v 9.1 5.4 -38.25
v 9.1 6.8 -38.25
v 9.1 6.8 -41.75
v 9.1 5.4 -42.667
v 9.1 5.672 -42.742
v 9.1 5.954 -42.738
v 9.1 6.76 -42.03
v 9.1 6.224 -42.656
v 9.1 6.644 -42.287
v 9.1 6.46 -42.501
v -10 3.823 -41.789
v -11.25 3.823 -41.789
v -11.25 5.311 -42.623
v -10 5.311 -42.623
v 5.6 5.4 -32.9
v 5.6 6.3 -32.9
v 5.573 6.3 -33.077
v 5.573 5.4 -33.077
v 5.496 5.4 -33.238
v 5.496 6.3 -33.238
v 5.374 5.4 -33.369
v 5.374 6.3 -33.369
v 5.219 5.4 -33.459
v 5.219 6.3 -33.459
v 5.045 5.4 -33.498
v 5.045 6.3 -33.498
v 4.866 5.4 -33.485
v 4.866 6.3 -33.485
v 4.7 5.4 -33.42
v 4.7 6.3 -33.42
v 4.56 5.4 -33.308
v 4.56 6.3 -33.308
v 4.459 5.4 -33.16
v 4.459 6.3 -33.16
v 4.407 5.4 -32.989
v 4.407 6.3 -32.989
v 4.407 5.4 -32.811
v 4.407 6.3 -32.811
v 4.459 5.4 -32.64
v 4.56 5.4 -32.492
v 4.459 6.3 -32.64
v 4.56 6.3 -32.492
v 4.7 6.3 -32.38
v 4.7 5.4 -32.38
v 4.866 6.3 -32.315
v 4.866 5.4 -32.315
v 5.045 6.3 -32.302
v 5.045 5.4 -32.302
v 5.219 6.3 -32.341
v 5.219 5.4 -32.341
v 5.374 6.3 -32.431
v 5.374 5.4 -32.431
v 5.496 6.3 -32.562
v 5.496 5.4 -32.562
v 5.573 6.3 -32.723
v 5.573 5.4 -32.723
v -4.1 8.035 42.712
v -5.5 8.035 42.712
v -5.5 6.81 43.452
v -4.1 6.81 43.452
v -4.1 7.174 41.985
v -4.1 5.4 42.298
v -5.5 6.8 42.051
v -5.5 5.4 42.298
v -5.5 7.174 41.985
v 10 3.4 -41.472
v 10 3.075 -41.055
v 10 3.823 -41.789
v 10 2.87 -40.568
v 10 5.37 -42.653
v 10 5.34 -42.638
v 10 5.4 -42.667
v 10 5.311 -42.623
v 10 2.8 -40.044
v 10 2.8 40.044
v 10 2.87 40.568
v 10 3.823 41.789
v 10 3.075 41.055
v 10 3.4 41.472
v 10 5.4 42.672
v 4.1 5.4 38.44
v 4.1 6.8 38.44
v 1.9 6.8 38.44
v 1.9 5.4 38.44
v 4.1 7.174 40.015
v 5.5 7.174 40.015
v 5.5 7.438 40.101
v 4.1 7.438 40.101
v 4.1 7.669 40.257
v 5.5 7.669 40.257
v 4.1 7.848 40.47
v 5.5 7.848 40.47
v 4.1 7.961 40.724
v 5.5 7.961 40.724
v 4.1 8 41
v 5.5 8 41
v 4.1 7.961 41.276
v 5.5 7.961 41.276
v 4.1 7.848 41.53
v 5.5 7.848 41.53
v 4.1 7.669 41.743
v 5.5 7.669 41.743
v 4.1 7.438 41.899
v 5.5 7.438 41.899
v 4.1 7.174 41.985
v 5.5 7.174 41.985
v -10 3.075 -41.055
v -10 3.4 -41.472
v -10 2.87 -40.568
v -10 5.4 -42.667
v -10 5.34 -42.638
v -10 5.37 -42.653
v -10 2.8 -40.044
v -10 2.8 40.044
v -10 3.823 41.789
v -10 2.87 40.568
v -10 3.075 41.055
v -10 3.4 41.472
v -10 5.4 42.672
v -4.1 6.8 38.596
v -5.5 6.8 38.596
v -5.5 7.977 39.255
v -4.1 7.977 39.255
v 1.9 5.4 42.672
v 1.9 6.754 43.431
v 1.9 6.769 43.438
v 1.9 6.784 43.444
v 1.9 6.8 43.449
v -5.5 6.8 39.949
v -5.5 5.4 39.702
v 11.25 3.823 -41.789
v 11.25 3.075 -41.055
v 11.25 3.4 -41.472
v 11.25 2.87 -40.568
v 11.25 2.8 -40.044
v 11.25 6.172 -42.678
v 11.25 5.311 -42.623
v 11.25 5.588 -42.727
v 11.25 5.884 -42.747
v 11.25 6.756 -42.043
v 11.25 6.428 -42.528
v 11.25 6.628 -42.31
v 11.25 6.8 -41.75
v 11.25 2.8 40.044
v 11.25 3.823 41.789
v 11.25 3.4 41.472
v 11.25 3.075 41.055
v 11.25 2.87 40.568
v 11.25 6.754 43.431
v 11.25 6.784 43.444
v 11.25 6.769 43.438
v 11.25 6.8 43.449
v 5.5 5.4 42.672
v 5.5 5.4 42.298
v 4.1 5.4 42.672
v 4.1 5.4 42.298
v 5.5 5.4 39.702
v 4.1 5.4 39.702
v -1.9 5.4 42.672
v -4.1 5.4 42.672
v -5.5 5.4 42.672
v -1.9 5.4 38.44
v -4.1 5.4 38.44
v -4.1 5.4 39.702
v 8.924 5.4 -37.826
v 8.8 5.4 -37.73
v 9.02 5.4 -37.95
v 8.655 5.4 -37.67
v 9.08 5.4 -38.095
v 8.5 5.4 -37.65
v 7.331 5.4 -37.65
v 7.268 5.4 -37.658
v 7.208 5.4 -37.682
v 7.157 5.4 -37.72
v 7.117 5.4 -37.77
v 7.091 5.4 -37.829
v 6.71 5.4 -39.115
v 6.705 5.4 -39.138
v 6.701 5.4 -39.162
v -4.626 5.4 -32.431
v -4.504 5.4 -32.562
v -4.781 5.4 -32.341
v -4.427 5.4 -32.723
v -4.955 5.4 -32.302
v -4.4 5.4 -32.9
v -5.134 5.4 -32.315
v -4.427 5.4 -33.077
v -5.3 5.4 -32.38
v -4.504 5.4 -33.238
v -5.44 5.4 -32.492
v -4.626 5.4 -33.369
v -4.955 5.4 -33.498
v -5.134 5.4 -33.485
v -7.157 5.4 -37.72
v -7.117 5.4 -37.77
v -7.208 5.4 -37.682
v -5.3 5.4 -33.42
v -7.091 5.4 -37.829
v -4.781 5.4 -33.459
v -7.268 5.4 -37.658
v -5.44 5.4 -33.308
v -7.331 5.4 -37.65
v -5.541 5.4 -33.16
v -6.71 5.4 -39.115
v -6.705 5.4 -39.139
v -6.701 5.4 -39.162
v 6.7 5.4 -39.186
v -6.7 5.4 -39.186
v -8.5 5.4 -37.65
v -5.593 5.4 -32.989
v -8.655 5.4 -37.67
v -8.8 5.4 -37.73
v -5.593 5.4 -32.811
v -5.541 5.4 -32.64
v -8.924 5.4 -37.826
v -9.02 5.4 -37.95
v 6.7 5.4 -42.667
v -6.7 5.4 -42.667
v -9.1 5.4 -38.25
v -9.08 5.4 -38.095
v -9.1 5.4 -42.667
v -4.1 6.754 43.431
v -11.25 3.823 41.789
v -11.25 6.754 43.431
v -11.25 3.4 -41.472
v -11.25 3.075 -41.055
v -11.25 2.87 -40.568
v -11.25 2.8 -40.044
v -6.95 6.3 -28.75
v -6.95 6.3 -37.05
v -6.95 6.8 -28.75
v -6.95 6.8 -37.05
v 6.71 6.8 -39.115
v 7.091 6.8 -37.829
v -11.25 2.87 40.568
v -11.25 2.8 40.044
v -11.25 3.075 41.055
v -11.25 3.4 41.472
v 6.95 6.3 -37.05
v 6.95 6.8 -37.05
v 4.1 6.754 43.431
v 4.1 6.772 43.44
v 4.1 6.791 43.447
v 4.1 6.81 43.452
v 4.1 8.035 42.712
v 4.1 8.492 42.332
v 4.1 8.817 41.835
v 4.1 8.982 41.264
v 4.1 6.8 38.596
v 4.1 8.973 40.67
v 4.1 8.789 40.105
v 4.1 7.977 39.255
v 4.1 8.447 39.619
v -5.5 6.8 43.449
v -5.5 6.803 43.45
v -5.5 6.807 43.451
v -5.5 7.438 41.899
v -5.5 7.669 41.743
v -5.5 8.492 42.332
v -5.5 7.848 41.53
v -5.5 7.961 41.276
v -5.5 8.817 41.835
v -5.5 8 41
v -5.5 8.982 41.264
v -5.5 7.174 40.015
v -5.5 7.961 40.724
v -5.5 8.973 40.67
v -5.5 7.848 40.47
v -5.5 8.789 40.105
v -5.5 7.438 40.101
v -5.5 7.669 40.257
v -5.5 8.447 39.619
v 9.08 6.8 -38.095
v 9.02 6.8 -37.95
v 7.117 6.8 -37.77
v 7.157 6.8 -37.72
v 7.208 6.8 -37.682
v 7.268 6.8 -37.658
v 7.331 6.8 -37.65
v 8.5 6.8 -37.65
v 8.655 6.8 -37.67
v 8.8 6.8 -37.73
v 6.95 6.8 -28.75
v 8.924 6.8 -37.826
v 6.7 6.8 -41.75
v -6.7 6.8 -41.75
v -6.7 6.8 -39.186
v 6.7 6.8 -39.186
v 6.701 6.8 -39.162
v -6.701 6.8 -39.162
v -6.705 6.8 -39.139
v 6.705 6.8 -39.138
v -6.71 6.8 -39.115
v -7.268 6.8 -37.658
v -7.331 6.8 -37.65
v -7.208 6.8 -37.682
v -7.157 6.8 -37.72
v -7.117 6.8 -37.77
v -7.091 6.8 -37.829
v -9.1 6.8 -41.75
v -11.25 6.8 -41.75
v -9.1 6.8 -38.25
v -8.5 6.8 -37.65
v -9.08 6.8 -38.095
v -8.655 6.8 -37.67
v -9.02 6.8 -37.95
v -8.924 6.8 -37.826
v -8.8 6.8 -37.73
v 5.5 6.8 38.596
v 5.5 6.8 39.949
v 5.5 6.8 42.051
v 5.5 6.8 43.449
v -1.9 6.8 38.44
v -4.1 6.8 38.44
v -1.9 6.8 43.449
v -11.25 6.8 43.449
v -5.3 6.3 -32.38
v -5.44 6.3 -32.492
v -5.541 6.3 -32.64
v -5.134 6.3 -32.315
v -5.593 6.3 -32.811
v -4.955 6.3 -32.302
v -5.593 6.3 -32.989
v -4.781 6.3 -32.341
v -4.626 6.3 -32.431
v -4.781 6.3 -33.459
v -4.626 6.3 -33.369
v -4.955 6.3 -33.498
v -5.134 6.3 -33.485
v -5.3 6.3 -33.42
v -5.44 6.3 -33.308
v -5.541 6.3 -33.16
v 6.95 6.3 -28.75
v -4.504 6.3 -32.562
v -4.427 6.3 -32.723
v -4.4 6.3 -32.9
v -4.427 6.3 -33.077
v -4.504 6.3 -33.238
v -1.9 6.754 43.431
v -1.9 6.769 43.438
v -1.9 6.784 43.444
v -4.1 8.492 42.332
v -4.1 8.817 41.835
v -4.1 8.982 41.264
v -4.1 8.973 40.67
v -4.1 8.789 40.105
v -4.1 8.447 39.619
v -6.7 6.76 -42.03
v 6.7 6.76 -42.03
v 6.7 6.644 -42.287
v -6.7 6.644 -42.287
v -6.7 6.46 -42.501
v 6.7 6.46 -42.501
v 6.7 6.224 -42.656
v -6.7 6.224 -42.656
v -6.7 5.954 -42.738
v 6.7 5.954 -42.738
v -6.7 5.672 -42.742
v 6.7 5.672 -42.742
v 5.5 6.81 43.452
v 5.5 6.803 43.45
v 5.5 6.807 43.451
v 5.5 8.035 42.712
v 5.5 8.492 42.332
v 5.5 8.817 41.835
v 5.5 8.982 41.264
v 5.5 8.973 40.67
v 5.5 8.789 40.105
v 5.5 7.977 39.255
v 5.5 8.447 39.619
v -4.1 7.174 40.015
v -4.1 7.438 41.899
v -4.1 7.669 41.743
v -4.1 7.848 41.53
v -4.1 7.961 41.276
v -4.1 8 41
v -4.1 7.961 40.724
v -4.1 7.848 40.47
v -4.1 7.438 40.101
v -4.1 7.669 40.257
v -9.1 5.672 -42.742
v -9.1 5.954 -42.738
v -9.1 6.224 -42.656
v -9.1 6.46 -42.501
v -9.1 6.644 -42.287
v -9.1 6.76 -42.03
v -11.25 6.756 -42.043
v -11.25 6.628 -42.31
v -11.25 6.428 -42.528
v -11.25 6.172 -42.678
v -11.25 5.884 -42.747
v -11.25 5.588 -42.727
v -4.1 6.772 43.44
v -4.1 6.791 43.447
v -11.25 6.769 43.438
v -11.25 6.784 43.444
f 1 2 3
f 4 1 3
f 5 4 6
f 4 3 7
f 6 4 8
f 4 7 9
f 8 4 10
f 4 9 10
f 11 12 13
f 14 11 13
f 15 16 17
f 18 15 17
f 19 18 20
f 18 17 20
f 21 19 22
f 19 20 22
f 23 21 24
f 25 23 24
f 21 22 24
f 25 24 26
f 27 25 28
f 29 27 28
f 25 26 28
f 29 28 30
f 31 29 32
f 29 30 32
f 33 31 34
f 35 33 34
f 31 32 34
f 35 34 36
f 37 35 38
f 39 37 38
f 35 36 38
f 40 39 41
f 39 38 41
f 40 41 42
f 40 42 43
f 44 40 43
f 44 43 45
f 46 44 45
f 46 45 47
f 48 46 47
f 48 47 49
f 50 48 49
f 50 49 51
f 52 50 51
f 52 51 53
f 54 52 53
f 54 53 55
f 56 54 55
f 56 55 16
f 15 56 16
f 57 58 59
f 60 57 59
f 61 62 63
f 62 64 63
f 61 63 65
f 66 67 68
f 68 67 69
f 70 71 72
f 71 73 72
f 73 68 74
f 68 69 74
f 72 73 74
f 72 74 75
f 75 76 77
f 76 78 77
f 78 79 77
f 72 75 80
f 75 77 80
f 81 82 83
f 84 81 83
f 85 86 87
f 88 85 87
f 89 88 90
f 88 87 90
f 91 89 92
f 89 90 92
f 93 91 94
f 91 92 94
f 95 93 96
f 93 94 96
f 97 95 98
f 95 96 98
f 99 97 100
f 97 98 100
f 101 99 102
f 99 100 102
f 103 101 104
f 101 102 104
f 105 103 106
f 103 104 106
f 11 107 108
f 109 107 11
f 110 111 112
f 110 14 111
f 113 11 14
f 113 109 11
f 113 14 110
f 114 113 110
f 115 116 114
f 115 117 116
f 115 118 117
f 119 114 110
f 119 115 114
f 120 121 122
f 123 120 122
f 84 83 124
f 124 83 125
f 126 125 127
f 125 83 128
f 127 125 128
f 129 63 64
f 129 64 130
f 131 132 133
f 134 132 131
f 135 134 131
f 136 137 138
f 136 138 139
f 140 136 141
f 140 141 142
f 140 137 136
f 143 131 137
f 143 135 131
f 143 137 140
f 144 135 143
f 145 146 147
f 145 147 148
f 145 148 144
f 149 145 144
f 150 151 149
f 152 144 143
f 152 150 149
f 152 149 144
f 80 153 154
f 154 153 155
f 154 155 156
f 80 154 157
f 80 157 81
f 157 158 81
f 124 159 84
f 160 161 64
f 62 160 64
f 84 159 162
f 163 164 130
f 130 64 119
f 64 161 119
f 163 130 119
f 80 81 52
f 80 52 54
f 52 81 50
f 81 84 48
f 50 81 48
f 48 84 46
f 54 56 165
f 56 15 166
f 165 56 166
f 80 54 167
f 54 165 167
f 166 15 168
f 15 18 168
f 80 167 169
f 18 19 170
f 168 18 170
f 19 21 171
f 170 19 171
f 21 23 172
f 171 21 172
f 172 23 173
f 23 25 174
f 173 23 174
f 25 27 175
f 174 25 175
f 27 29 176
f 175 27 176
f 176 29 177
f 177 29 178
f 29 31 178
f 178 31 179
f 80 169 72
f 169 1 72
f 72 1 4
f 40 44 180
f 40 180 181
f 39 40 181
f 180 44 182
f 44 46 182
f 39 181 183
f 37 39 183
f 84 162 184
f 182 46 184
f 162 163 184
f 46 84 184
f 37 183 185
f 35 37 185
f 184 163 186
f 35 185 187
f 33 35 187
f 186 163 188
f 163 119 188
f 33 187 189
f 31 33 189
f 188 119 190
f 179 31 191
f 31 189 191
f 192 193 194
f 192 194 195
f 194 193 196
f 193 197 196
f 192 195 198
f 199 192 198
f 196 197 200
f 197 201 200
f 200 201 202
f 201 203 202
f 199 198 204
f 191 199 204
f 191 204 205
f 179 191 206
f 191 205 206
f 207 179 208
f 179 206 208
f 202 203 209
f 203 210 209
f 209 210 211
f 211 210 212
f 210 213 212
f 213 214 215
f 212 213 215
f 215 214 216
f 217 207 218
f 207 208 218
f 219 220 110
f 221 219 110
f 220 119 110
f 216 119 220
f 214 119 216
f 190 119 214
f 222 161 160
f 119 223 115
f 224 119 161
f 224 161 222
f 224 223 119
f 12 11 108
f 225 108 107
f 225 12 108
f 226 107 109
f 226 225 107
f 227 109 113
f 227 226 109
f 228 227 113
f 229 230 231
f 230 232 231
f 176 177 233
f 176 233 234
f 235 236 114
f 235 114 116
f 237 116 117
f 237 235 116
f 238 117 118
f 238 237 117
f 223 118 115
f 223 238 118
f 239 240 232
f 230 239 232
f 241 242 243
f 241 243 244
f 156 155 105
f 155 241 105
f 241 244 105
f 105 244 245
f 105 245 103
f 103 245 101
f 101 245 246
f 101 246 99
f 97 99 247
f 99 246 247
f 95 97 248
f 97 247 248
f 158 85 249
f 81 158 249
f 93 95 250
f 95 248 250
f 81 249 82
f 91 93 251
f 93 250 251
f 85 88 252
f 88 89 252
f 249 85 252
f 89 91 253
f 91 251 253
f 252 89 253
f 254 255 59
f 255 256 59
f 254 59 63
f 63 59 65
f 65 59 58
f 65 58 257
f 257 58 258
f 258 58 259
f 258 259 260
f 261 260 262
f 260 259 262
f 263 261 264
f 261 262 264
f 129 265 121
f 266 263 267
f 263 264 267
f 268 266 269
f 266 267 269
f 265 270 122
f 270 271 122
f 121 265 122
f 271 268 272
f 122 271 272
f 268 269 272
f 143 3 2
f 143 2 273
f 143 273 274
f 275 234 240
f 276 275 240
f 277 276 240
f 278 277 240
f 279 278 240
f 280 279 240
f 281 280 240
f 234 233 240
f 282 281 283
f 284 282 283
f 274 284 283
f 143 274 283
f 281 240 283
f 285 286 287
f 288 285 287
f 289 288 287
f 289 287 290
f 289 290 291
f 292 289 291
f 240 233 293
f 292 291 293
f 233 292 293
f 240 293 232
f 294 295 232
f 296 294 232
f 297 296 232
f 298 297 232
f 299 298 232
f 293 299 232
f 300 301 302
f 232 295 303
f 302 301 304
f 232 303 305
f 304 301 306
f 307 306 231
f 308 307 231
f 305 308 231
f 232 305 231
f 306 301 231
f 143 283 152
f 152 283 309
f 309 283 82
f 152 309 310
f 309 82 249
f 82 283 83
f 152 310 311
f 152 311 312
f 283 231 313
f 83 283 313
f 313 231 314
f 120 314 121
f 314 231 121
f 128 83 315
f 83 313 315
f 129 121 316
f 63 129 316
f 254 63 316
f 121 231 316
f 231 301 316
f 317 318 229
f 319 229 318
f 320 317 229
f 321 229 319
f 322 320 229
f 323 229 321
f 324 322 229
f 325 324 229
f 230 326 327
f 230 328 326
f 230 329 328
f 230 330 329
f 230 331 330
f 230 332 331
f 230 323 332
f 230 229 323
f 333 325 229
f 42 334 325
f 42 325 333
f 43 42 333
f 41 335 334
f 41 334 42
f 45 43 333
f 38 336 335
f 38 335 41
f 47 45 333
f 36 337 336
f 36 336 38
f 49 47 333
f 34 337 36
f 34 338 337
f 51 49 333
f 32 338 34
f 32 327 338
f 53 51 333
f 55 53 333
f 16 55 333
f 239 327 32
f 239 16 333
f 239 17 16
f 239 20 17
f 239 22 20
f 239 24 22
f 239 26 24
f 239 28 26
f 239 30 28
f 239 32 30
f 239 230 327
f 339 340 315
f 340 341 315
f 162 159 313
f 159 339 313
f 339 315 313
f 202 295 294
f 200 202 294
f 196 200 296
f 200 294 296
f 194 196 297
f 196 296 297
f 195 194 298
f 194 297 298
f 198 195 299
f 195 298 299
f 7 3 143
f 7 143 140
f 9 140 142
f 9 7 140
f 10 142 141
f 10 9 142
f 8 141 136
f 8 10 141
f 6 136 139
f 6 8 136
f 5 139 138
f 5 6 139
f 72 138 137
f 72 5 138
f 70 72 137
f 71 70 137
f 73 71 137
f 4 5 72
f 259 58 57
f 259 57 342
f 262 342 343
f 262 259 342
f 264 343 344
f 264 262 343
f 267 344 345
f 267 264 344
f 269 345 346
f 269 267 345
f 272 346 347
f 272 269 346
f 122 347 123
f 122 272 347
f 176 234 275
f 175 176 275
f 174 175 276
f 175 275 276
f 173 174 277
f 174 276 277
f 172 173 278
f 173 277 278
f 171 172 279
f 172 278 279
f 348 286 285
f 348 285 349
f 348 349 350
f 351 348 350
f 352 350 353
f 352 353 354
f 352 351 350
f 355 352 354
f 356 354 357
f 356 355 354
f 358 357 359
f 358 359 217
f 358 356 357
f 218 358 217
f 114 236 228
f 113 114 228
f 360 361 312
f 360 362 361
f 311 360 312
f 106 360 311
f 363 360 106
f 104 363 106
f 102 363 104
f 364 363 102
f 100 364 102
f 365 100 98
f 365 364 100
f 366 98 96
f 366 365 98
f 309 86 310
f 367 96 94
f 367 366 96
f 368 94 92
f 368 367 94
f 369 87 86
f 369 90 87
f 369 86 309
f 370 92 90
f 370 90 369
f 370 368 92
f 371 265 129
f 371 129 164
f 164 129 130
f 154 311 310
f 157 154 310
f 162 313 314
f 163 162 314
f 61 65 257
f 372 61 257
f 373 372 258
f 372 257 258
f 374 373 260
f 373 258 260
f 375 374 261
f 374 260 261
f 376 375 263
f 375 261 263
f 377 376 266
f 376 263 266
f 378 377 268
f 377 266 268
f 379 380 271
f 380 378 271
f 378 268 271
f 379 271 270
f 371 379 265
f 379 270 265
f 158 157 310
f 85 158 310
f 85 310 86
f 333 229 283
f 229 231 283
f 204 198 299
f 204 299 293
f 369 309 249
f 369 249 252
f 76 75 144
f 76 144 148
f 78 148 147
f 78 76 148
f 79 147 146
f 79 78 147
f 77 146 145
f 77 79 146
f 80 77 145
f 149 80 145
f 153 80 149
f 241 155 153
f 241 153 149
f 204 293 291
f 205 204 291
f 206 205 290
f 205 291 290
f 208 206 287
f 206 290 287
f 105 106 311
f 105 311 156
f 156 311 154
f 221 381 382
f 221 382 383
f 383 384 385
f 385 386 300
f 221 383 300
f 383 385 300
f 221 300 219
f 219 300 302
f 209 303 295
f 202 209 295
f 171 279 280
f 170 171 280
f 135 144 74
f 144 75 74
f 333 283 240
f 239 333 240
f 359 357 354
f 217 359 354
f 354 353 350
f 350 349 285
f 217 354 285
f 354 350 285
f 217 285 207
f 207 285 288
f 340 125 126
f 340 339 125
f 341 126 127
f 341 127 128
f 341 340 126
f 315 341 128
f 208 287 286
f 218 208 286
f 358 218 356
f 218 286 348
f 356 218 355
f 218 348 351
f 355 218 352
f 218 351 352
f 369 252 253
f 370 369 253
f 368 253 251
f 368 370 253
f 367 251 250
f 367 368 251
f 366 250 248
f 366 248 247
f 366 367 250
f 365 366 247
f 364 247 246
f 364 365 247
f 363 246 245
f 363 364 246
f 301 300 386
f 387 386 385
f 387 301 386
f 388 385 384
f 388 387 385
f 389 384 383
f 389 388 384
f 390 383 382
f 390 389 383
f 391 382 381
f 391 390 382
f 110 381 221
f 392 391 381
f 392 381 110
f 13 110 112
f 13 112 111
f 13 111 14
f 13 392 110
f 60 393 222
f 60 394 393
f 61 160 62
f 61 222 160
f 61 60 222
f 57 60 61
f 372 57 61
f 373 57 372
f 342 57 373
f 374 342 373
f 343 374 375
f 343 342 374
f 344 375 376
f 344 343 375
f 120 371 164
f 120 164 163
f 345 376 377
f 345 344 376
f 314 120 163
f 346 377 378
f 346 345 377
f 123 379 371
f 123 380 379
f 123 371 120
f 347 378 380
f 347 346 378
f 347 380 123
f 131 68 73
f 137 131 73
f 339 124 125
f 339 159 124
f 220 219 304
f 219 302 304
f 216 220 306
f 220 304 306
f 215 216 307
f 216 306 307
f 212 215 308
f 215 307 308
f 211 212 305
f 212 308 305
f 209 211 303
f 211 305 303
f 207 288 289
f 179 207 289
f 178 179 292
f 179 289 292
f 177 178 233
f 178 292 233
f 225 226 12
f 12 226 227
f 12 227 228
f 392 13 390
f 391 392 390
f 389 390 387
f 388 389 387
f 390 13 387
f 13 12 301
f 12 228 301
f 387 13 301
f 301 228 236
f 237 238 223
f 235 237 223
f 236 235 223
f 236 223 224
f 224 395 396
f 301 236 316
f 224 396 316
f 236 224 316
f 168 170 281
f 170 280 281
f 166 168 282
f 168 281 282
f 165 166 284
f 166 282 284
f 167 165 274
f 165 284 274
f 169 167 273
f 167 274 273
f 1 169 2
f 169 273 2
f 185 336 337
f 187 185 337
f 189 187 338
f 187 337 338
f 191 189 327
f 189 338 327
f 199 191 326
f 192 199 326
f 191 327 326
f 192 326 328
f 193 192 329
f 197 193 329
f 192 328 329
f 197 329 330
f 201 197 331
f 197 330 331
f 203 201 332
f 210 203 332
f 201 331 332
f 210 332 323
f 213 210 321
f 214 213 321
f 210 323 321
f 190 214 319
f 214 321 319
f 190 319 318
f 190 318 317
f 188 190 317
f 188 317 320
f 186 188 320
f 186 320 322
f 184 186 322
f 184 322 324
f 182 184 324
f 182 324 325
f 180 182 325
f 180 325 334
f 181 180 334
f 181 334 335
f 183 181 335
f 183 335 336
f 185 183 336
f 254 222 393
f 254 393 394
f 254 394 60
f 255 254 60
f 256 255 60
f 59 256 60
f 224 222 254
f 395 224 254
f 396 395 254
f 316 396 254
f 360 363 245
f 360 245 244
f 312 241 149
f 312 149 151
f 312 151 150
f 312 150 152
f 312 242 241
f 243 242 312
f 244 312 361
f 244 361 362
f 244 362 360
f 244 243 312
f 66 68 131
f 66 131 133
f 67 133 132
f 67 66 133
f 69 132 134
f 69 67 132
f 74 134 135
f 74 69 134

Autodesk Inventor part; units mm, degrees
sketch "Sketch_1" plane through (0, 0, 0) normal (1, 0, 0) x (0, 1, 0)
  line L0 (6.8, 43.4562) -> (3.8228, 41.7889)
  arc A0 (3.8228, 41.7889) -> (2.8, 40.0439) centre (4.8, 40.0439) ccw
  line L1 (2.8, 40.0439) -> (2.8, -40.0439)
  arc A1 (2.8, -40.0439) -> (3.8228, -41.7889) centre (4.8, -40.0439) ccw
  line L2 (3.8228, -41.7889) -> (5.3114, -42.6226)
  arc A2 (5.3114, -42.6226) -> (6.8, -41.7501) centre (5.8, -41.7501) ccw
  line L3 (6.8, -41.7501) -> (6.8, 43.4562)
extrude "Extrusion1" add sketch "Sketch_1" along normal mid plane 22.5
sketch "Sketch_4" plane through (0, 0, 0) normal (1, 0, 0) x (0, 1, 0)
  line L0 (6.78, 48.4) -> (-1, 48.4)
  line L1 (-1, 48.4) -> (-1, -48.4)
  line L2 (-1, -48.4) -> (6.78, -48.4)
  line L3 (6.78, -48.4) -> (7.1588, -48.2985)
  arc A0 (7.1588, -48.2985) -> (7.9, -47.3326) centre (6.9, -47.3326) ccw
  line L4 (7.9, -47.3326) -> (7.9, -45.0762)
  arc A1 (7.9, -45.0762) -> (7.3886, -44.2037) centre (6.9, -45.0762) ccw
  line L5 (7.3886, -44.2037) -> (5.4, -43.09)
  line L6 (5.4, -43.09) -> (5.4, 43.09)
  line L7 (5.4, 43.09) -> (7.3886, 44.2037)
  arc A2 (7.3886, 44.2037) -> (7.9, 45.0762) centre (6.9, 45.0762) ccw
  line L8 (7.9, 45.0762) -> (7.9, 47.3326)
  arc A3 (7.9, 47.3326) -> (7.1588, 48.2985) centre (6.9, 47.3326) ccw
  line L9 (7.1588, 48.2985) -> (6.78, 48.4)
extrude "Extrusion2" cut sketch "Sketch_4" along normal mid plane 20
sketch "Sketch_10" plane through (5.5, 0, 0) normal (1, 0, 0) x (0, 0, -1)
  line L0 (-43.5, 6.7302) -> (-42.755, 5.4)
  line L1 (-42.755, 5.4) -> (-42.2975, 5.4)
  line L2 (-42.2975, 5.4) -> (-41.9848, 7.1736)
  arc A0 (-40.0152, 7.1736) -> (-41.9848, 7.1736) centre (-41, 7) ccw
  line L3 (-40.0152, 7.1736) -> (-39.7025, 5.4)
  line L4 (-39.7025, 5.4) -> (-37.8117, 5.4)
  line L5 (-37.8117, 5.4) -> (-39.255, 7.9772)
  arc A1 (-39.255, 7.9772) -> (-42.7116, 8.0346) centre (-41, 7) ccw
  line L6 (-42.7116, 8.0346) -> (-43.5, 6.7302)
extrude "Extrusion3" add sketch "Sketch_10" against normal blind 1.4
sketch "Sketch_2" plane through (-5.5, 0, 0) normal (1, 0, 0) x (0, 0, -1)
  line L0 (-43.5, 6.7302) -> (-42.755, 5.4)
  line L1 (-42.755, 5.4) -> (-42.2975, 5.4)
  line L2 (-42.2975, 5.4) -> (-41.9848, 7.1736)
  arc A0 (-40.0152, 7.1736) -> (-41.9848, 7.1736) centre (-41, 7) ccw
  line L3 (-40.0152, 7.1736) -> (-39.7025, 5.4)
  line L4 (-39.7025, 5.4) -> (-37.8117, 5.4)
  line L5 (-37.8117, 5.4) -> (-39.255, 7.9772)
  arc A1 (-39.255, 7.9772) -> (-42.7116, 8.0346) centre (-41, 7) ccw
  line L6 (-42.7116, 8.0346) -> (-43.5, 6.7302)
extrude "Extrusion4" add sketch "Sketch_2" along normal blind 1.4
sketch "Sketch_3" plane through (0, 0, 0) normal (1, 0, 0) x (0, 1, 0)
  line L0 (7.3, 45) -> (2.8, 45)
  line L1 (2.8, 45) -> (2.8, 41.2161)
  line L2 (2.8, 41.2161) -> (6.7545, 43.4307)
  arc A0 (6.8522, 43.4562) -> (6.7545, 43.4307) centre (6.8522, 43.2562) ccw
  line L3 (6.8522, 43.4562) -> (7.3, 43.4562)
  line L4 (7.3, 43.4562) -> (7.3, 45)
extrude "Extrusion5" cut sketch "Sketch_3" along normal mid plane 24
sketch "Sketch_5" plane through (0, 6.8, 0) normal (0, 1, 0) x (1, 0, 0)
  line L0 (-4.1, -38.44) -> (-4.1, -47)
  line L1 (-4.1, -47) -> (4.1, -47)
  line L2 (4.1, -47) -> (4.1, -38.44)
  line L3 (4.1, -38.44) -> (1.9, -38.44)
  line L4 (1.9, -38.44) -> (1.9, -45)
  line L5 (1.9, -45) -> (-1.9, -45)
  line L6 (-1.9, -45) -> (-1.9, -38.44)
  line L7 (-1.9, -38.44) -> (-4.1, -38.44)
extrude "Extrusion6" cut sketch "Sketch_5" against normal blind 1.5
sketch "Sketch_6" plane through (5.5, 0, 0) normal (1, 0, 0) x (0, 0, -1)
  line L0 (-42.2975, 5.4) -> (-39.7025, 5.4)
  line L1 (-39.7025, 5.4) -> (-40.0152, 7.1736)
  arc A0 (-40.0152, 7.1736) -> (-41.9848, 7.1736) centre (-41, 7) ccw
  line L2 (-41.9848, 7.1736) -> (-42.2975, 5.4)
extrude "Extrusion7" cut sketch "Sketch_6" against normal blind 1.5
sketch "Sketch_7" plane through (-5.5, 0, 0) normal (1, 0, 0) x (0, 0, -1)
  line L0 (-42.2975, 5.4) -> (-39.7025, 5.4)
  line L1 (-39.7025, 5.4) -> (-40.0152, 7.1736)
  arc A0 (-40.0152, 7.1736) -> (-41.9848, 7.1736) centre (-41, 7) ccw
  line L2 (-41.9848, 7.1736) -> (-42.2975, 5.4)
extrude "Extrusion8" cut sketch "Sketch_7" along normal blind 1.5
sketch "Sketch_8" plane through (0, 6.8, 0) normal (0, 1, 0) x (1, 0, 0)
  line L0 (-9.1, 46) -> (-9.1, 38.25)
  arc A0 (-9.1, 38.25) -> (-8.5, 37.65) centre (-8.5, 38.25) ccw
  line L1 (-8.5, 37.65) -> (-7.331, 37.65)
  arc A1 (-7.331, 37.65) -> (-7.0913, 37.829) centre (-7.331, 37.9) ccw
  line L2 (-7.0913, 37.829) -> (-6.7103, 39.1152)
  arc A2 (-6.7103, 39.1152) -> (-6.7, 39.1862) centre (-6.95, 39.1862) ccw
  line L3 (-6.7, 39.1862) -> (-6.7, 44)
  line L4 (-6.7, 44) -> (6.7, 44)
  line L5 (6.7, 44) -> (6.7, 39.1862)
  arc A3 (6.7, 39.1862) -> (6.7103, 39.1152) centre (6.95, 39.1862) ccw
  line L6 (6.7103, 39.1152) -> (7.0913, 37.829)
  arc A4 (7.0913, 37.829) -> (7.331, 37.65) centre (7.331, 37.9) ccw
  line L7 (7.331, 37.65) -> (8.5, 37.65)
  arc A5 (8.5, 37.65) -> (9.1, 38.25) centre (8.5, 38.25) ccw
  line L8 (9.1, 38.25) -> (9.1, 46)
  line L9 (9.1, 46) -> (-9.1, 46)
extrude "Extrusion9" cut sketch "Sketch_8" against normal blind 1.5
sketch "Sketch_11" plane through (0, 6.8, 0) normal (0, 1, 0) x (1, 0, 0)
  line L0 (-6.95, 28.75) -> (6.95, 28.75)
  line L1 (6.95, 28.75) -> (6.95, 37.05)
  line L2 (6.95, 37.05) -> (-6.95, 37.05)
  line L3 (-6.95, 37.05) -> (-6.95, 28.75)
extrude "Extrusion10" cut sketch "Sketch_11" against normal blind 0.5
sketch "Sketch_13" plane through (0, 6.8, 0) normal (0, 1, 0) x (1, 0, 0)
  circle A0 centre (-5, 32.9) radius 0.6
extrude "Extrusion11" cut sketch "Sketch_13" against normal blind 1.5
sketch "Sketch_14" plane through (0, 6.8, 0) normal (0, 1, 0) x (1, 0, 0)
  circle A0 centre (5, 32.9) radius 0.6
extrude "Extrusion12" cut sketch "Sketch_14" against normal blind 1.5
ref_plane "CP_XY" through (0, 0, 0) normal (0, 1, 0) x (1, 0, 0)
ref_plane "CP_YZ" through (0, 0, 0) normal (1, 0, 0) x (0, 0, -1)
ref_plane "CP_ZX" through (0, 0, 0) normal (0, 0, -1) x (0, 1, 0)
ref_plane "mitFront_XY" through (0, 7, 41) normal (1, 0, 0) x (0, 0, -1)
ref_plane "mitFront_YZ" through (0, 7, 41) normal (0, 0, -1) x (0, 1, 0)
ref_plane "mitFront_ZX" through (0, 7, 41) normal (0, 1, 0) x (1, 0, 0)
ref_plane "mitMark_XY" through (0, 6.3, -32.9) normal (0, -1, 0) x (1, 0, 0)
ref_plane "mitMark_YZ" through (0, 6.3, -32.9) normal (1, 0, 0) x (0, 0, 1)
ref_plane "mitMark_ZX" through (0, 6.3, -32.9) normal (0, 0, 1) x (0, -1, 0)
properties part number "CH20M22 C BK 2418670000"
